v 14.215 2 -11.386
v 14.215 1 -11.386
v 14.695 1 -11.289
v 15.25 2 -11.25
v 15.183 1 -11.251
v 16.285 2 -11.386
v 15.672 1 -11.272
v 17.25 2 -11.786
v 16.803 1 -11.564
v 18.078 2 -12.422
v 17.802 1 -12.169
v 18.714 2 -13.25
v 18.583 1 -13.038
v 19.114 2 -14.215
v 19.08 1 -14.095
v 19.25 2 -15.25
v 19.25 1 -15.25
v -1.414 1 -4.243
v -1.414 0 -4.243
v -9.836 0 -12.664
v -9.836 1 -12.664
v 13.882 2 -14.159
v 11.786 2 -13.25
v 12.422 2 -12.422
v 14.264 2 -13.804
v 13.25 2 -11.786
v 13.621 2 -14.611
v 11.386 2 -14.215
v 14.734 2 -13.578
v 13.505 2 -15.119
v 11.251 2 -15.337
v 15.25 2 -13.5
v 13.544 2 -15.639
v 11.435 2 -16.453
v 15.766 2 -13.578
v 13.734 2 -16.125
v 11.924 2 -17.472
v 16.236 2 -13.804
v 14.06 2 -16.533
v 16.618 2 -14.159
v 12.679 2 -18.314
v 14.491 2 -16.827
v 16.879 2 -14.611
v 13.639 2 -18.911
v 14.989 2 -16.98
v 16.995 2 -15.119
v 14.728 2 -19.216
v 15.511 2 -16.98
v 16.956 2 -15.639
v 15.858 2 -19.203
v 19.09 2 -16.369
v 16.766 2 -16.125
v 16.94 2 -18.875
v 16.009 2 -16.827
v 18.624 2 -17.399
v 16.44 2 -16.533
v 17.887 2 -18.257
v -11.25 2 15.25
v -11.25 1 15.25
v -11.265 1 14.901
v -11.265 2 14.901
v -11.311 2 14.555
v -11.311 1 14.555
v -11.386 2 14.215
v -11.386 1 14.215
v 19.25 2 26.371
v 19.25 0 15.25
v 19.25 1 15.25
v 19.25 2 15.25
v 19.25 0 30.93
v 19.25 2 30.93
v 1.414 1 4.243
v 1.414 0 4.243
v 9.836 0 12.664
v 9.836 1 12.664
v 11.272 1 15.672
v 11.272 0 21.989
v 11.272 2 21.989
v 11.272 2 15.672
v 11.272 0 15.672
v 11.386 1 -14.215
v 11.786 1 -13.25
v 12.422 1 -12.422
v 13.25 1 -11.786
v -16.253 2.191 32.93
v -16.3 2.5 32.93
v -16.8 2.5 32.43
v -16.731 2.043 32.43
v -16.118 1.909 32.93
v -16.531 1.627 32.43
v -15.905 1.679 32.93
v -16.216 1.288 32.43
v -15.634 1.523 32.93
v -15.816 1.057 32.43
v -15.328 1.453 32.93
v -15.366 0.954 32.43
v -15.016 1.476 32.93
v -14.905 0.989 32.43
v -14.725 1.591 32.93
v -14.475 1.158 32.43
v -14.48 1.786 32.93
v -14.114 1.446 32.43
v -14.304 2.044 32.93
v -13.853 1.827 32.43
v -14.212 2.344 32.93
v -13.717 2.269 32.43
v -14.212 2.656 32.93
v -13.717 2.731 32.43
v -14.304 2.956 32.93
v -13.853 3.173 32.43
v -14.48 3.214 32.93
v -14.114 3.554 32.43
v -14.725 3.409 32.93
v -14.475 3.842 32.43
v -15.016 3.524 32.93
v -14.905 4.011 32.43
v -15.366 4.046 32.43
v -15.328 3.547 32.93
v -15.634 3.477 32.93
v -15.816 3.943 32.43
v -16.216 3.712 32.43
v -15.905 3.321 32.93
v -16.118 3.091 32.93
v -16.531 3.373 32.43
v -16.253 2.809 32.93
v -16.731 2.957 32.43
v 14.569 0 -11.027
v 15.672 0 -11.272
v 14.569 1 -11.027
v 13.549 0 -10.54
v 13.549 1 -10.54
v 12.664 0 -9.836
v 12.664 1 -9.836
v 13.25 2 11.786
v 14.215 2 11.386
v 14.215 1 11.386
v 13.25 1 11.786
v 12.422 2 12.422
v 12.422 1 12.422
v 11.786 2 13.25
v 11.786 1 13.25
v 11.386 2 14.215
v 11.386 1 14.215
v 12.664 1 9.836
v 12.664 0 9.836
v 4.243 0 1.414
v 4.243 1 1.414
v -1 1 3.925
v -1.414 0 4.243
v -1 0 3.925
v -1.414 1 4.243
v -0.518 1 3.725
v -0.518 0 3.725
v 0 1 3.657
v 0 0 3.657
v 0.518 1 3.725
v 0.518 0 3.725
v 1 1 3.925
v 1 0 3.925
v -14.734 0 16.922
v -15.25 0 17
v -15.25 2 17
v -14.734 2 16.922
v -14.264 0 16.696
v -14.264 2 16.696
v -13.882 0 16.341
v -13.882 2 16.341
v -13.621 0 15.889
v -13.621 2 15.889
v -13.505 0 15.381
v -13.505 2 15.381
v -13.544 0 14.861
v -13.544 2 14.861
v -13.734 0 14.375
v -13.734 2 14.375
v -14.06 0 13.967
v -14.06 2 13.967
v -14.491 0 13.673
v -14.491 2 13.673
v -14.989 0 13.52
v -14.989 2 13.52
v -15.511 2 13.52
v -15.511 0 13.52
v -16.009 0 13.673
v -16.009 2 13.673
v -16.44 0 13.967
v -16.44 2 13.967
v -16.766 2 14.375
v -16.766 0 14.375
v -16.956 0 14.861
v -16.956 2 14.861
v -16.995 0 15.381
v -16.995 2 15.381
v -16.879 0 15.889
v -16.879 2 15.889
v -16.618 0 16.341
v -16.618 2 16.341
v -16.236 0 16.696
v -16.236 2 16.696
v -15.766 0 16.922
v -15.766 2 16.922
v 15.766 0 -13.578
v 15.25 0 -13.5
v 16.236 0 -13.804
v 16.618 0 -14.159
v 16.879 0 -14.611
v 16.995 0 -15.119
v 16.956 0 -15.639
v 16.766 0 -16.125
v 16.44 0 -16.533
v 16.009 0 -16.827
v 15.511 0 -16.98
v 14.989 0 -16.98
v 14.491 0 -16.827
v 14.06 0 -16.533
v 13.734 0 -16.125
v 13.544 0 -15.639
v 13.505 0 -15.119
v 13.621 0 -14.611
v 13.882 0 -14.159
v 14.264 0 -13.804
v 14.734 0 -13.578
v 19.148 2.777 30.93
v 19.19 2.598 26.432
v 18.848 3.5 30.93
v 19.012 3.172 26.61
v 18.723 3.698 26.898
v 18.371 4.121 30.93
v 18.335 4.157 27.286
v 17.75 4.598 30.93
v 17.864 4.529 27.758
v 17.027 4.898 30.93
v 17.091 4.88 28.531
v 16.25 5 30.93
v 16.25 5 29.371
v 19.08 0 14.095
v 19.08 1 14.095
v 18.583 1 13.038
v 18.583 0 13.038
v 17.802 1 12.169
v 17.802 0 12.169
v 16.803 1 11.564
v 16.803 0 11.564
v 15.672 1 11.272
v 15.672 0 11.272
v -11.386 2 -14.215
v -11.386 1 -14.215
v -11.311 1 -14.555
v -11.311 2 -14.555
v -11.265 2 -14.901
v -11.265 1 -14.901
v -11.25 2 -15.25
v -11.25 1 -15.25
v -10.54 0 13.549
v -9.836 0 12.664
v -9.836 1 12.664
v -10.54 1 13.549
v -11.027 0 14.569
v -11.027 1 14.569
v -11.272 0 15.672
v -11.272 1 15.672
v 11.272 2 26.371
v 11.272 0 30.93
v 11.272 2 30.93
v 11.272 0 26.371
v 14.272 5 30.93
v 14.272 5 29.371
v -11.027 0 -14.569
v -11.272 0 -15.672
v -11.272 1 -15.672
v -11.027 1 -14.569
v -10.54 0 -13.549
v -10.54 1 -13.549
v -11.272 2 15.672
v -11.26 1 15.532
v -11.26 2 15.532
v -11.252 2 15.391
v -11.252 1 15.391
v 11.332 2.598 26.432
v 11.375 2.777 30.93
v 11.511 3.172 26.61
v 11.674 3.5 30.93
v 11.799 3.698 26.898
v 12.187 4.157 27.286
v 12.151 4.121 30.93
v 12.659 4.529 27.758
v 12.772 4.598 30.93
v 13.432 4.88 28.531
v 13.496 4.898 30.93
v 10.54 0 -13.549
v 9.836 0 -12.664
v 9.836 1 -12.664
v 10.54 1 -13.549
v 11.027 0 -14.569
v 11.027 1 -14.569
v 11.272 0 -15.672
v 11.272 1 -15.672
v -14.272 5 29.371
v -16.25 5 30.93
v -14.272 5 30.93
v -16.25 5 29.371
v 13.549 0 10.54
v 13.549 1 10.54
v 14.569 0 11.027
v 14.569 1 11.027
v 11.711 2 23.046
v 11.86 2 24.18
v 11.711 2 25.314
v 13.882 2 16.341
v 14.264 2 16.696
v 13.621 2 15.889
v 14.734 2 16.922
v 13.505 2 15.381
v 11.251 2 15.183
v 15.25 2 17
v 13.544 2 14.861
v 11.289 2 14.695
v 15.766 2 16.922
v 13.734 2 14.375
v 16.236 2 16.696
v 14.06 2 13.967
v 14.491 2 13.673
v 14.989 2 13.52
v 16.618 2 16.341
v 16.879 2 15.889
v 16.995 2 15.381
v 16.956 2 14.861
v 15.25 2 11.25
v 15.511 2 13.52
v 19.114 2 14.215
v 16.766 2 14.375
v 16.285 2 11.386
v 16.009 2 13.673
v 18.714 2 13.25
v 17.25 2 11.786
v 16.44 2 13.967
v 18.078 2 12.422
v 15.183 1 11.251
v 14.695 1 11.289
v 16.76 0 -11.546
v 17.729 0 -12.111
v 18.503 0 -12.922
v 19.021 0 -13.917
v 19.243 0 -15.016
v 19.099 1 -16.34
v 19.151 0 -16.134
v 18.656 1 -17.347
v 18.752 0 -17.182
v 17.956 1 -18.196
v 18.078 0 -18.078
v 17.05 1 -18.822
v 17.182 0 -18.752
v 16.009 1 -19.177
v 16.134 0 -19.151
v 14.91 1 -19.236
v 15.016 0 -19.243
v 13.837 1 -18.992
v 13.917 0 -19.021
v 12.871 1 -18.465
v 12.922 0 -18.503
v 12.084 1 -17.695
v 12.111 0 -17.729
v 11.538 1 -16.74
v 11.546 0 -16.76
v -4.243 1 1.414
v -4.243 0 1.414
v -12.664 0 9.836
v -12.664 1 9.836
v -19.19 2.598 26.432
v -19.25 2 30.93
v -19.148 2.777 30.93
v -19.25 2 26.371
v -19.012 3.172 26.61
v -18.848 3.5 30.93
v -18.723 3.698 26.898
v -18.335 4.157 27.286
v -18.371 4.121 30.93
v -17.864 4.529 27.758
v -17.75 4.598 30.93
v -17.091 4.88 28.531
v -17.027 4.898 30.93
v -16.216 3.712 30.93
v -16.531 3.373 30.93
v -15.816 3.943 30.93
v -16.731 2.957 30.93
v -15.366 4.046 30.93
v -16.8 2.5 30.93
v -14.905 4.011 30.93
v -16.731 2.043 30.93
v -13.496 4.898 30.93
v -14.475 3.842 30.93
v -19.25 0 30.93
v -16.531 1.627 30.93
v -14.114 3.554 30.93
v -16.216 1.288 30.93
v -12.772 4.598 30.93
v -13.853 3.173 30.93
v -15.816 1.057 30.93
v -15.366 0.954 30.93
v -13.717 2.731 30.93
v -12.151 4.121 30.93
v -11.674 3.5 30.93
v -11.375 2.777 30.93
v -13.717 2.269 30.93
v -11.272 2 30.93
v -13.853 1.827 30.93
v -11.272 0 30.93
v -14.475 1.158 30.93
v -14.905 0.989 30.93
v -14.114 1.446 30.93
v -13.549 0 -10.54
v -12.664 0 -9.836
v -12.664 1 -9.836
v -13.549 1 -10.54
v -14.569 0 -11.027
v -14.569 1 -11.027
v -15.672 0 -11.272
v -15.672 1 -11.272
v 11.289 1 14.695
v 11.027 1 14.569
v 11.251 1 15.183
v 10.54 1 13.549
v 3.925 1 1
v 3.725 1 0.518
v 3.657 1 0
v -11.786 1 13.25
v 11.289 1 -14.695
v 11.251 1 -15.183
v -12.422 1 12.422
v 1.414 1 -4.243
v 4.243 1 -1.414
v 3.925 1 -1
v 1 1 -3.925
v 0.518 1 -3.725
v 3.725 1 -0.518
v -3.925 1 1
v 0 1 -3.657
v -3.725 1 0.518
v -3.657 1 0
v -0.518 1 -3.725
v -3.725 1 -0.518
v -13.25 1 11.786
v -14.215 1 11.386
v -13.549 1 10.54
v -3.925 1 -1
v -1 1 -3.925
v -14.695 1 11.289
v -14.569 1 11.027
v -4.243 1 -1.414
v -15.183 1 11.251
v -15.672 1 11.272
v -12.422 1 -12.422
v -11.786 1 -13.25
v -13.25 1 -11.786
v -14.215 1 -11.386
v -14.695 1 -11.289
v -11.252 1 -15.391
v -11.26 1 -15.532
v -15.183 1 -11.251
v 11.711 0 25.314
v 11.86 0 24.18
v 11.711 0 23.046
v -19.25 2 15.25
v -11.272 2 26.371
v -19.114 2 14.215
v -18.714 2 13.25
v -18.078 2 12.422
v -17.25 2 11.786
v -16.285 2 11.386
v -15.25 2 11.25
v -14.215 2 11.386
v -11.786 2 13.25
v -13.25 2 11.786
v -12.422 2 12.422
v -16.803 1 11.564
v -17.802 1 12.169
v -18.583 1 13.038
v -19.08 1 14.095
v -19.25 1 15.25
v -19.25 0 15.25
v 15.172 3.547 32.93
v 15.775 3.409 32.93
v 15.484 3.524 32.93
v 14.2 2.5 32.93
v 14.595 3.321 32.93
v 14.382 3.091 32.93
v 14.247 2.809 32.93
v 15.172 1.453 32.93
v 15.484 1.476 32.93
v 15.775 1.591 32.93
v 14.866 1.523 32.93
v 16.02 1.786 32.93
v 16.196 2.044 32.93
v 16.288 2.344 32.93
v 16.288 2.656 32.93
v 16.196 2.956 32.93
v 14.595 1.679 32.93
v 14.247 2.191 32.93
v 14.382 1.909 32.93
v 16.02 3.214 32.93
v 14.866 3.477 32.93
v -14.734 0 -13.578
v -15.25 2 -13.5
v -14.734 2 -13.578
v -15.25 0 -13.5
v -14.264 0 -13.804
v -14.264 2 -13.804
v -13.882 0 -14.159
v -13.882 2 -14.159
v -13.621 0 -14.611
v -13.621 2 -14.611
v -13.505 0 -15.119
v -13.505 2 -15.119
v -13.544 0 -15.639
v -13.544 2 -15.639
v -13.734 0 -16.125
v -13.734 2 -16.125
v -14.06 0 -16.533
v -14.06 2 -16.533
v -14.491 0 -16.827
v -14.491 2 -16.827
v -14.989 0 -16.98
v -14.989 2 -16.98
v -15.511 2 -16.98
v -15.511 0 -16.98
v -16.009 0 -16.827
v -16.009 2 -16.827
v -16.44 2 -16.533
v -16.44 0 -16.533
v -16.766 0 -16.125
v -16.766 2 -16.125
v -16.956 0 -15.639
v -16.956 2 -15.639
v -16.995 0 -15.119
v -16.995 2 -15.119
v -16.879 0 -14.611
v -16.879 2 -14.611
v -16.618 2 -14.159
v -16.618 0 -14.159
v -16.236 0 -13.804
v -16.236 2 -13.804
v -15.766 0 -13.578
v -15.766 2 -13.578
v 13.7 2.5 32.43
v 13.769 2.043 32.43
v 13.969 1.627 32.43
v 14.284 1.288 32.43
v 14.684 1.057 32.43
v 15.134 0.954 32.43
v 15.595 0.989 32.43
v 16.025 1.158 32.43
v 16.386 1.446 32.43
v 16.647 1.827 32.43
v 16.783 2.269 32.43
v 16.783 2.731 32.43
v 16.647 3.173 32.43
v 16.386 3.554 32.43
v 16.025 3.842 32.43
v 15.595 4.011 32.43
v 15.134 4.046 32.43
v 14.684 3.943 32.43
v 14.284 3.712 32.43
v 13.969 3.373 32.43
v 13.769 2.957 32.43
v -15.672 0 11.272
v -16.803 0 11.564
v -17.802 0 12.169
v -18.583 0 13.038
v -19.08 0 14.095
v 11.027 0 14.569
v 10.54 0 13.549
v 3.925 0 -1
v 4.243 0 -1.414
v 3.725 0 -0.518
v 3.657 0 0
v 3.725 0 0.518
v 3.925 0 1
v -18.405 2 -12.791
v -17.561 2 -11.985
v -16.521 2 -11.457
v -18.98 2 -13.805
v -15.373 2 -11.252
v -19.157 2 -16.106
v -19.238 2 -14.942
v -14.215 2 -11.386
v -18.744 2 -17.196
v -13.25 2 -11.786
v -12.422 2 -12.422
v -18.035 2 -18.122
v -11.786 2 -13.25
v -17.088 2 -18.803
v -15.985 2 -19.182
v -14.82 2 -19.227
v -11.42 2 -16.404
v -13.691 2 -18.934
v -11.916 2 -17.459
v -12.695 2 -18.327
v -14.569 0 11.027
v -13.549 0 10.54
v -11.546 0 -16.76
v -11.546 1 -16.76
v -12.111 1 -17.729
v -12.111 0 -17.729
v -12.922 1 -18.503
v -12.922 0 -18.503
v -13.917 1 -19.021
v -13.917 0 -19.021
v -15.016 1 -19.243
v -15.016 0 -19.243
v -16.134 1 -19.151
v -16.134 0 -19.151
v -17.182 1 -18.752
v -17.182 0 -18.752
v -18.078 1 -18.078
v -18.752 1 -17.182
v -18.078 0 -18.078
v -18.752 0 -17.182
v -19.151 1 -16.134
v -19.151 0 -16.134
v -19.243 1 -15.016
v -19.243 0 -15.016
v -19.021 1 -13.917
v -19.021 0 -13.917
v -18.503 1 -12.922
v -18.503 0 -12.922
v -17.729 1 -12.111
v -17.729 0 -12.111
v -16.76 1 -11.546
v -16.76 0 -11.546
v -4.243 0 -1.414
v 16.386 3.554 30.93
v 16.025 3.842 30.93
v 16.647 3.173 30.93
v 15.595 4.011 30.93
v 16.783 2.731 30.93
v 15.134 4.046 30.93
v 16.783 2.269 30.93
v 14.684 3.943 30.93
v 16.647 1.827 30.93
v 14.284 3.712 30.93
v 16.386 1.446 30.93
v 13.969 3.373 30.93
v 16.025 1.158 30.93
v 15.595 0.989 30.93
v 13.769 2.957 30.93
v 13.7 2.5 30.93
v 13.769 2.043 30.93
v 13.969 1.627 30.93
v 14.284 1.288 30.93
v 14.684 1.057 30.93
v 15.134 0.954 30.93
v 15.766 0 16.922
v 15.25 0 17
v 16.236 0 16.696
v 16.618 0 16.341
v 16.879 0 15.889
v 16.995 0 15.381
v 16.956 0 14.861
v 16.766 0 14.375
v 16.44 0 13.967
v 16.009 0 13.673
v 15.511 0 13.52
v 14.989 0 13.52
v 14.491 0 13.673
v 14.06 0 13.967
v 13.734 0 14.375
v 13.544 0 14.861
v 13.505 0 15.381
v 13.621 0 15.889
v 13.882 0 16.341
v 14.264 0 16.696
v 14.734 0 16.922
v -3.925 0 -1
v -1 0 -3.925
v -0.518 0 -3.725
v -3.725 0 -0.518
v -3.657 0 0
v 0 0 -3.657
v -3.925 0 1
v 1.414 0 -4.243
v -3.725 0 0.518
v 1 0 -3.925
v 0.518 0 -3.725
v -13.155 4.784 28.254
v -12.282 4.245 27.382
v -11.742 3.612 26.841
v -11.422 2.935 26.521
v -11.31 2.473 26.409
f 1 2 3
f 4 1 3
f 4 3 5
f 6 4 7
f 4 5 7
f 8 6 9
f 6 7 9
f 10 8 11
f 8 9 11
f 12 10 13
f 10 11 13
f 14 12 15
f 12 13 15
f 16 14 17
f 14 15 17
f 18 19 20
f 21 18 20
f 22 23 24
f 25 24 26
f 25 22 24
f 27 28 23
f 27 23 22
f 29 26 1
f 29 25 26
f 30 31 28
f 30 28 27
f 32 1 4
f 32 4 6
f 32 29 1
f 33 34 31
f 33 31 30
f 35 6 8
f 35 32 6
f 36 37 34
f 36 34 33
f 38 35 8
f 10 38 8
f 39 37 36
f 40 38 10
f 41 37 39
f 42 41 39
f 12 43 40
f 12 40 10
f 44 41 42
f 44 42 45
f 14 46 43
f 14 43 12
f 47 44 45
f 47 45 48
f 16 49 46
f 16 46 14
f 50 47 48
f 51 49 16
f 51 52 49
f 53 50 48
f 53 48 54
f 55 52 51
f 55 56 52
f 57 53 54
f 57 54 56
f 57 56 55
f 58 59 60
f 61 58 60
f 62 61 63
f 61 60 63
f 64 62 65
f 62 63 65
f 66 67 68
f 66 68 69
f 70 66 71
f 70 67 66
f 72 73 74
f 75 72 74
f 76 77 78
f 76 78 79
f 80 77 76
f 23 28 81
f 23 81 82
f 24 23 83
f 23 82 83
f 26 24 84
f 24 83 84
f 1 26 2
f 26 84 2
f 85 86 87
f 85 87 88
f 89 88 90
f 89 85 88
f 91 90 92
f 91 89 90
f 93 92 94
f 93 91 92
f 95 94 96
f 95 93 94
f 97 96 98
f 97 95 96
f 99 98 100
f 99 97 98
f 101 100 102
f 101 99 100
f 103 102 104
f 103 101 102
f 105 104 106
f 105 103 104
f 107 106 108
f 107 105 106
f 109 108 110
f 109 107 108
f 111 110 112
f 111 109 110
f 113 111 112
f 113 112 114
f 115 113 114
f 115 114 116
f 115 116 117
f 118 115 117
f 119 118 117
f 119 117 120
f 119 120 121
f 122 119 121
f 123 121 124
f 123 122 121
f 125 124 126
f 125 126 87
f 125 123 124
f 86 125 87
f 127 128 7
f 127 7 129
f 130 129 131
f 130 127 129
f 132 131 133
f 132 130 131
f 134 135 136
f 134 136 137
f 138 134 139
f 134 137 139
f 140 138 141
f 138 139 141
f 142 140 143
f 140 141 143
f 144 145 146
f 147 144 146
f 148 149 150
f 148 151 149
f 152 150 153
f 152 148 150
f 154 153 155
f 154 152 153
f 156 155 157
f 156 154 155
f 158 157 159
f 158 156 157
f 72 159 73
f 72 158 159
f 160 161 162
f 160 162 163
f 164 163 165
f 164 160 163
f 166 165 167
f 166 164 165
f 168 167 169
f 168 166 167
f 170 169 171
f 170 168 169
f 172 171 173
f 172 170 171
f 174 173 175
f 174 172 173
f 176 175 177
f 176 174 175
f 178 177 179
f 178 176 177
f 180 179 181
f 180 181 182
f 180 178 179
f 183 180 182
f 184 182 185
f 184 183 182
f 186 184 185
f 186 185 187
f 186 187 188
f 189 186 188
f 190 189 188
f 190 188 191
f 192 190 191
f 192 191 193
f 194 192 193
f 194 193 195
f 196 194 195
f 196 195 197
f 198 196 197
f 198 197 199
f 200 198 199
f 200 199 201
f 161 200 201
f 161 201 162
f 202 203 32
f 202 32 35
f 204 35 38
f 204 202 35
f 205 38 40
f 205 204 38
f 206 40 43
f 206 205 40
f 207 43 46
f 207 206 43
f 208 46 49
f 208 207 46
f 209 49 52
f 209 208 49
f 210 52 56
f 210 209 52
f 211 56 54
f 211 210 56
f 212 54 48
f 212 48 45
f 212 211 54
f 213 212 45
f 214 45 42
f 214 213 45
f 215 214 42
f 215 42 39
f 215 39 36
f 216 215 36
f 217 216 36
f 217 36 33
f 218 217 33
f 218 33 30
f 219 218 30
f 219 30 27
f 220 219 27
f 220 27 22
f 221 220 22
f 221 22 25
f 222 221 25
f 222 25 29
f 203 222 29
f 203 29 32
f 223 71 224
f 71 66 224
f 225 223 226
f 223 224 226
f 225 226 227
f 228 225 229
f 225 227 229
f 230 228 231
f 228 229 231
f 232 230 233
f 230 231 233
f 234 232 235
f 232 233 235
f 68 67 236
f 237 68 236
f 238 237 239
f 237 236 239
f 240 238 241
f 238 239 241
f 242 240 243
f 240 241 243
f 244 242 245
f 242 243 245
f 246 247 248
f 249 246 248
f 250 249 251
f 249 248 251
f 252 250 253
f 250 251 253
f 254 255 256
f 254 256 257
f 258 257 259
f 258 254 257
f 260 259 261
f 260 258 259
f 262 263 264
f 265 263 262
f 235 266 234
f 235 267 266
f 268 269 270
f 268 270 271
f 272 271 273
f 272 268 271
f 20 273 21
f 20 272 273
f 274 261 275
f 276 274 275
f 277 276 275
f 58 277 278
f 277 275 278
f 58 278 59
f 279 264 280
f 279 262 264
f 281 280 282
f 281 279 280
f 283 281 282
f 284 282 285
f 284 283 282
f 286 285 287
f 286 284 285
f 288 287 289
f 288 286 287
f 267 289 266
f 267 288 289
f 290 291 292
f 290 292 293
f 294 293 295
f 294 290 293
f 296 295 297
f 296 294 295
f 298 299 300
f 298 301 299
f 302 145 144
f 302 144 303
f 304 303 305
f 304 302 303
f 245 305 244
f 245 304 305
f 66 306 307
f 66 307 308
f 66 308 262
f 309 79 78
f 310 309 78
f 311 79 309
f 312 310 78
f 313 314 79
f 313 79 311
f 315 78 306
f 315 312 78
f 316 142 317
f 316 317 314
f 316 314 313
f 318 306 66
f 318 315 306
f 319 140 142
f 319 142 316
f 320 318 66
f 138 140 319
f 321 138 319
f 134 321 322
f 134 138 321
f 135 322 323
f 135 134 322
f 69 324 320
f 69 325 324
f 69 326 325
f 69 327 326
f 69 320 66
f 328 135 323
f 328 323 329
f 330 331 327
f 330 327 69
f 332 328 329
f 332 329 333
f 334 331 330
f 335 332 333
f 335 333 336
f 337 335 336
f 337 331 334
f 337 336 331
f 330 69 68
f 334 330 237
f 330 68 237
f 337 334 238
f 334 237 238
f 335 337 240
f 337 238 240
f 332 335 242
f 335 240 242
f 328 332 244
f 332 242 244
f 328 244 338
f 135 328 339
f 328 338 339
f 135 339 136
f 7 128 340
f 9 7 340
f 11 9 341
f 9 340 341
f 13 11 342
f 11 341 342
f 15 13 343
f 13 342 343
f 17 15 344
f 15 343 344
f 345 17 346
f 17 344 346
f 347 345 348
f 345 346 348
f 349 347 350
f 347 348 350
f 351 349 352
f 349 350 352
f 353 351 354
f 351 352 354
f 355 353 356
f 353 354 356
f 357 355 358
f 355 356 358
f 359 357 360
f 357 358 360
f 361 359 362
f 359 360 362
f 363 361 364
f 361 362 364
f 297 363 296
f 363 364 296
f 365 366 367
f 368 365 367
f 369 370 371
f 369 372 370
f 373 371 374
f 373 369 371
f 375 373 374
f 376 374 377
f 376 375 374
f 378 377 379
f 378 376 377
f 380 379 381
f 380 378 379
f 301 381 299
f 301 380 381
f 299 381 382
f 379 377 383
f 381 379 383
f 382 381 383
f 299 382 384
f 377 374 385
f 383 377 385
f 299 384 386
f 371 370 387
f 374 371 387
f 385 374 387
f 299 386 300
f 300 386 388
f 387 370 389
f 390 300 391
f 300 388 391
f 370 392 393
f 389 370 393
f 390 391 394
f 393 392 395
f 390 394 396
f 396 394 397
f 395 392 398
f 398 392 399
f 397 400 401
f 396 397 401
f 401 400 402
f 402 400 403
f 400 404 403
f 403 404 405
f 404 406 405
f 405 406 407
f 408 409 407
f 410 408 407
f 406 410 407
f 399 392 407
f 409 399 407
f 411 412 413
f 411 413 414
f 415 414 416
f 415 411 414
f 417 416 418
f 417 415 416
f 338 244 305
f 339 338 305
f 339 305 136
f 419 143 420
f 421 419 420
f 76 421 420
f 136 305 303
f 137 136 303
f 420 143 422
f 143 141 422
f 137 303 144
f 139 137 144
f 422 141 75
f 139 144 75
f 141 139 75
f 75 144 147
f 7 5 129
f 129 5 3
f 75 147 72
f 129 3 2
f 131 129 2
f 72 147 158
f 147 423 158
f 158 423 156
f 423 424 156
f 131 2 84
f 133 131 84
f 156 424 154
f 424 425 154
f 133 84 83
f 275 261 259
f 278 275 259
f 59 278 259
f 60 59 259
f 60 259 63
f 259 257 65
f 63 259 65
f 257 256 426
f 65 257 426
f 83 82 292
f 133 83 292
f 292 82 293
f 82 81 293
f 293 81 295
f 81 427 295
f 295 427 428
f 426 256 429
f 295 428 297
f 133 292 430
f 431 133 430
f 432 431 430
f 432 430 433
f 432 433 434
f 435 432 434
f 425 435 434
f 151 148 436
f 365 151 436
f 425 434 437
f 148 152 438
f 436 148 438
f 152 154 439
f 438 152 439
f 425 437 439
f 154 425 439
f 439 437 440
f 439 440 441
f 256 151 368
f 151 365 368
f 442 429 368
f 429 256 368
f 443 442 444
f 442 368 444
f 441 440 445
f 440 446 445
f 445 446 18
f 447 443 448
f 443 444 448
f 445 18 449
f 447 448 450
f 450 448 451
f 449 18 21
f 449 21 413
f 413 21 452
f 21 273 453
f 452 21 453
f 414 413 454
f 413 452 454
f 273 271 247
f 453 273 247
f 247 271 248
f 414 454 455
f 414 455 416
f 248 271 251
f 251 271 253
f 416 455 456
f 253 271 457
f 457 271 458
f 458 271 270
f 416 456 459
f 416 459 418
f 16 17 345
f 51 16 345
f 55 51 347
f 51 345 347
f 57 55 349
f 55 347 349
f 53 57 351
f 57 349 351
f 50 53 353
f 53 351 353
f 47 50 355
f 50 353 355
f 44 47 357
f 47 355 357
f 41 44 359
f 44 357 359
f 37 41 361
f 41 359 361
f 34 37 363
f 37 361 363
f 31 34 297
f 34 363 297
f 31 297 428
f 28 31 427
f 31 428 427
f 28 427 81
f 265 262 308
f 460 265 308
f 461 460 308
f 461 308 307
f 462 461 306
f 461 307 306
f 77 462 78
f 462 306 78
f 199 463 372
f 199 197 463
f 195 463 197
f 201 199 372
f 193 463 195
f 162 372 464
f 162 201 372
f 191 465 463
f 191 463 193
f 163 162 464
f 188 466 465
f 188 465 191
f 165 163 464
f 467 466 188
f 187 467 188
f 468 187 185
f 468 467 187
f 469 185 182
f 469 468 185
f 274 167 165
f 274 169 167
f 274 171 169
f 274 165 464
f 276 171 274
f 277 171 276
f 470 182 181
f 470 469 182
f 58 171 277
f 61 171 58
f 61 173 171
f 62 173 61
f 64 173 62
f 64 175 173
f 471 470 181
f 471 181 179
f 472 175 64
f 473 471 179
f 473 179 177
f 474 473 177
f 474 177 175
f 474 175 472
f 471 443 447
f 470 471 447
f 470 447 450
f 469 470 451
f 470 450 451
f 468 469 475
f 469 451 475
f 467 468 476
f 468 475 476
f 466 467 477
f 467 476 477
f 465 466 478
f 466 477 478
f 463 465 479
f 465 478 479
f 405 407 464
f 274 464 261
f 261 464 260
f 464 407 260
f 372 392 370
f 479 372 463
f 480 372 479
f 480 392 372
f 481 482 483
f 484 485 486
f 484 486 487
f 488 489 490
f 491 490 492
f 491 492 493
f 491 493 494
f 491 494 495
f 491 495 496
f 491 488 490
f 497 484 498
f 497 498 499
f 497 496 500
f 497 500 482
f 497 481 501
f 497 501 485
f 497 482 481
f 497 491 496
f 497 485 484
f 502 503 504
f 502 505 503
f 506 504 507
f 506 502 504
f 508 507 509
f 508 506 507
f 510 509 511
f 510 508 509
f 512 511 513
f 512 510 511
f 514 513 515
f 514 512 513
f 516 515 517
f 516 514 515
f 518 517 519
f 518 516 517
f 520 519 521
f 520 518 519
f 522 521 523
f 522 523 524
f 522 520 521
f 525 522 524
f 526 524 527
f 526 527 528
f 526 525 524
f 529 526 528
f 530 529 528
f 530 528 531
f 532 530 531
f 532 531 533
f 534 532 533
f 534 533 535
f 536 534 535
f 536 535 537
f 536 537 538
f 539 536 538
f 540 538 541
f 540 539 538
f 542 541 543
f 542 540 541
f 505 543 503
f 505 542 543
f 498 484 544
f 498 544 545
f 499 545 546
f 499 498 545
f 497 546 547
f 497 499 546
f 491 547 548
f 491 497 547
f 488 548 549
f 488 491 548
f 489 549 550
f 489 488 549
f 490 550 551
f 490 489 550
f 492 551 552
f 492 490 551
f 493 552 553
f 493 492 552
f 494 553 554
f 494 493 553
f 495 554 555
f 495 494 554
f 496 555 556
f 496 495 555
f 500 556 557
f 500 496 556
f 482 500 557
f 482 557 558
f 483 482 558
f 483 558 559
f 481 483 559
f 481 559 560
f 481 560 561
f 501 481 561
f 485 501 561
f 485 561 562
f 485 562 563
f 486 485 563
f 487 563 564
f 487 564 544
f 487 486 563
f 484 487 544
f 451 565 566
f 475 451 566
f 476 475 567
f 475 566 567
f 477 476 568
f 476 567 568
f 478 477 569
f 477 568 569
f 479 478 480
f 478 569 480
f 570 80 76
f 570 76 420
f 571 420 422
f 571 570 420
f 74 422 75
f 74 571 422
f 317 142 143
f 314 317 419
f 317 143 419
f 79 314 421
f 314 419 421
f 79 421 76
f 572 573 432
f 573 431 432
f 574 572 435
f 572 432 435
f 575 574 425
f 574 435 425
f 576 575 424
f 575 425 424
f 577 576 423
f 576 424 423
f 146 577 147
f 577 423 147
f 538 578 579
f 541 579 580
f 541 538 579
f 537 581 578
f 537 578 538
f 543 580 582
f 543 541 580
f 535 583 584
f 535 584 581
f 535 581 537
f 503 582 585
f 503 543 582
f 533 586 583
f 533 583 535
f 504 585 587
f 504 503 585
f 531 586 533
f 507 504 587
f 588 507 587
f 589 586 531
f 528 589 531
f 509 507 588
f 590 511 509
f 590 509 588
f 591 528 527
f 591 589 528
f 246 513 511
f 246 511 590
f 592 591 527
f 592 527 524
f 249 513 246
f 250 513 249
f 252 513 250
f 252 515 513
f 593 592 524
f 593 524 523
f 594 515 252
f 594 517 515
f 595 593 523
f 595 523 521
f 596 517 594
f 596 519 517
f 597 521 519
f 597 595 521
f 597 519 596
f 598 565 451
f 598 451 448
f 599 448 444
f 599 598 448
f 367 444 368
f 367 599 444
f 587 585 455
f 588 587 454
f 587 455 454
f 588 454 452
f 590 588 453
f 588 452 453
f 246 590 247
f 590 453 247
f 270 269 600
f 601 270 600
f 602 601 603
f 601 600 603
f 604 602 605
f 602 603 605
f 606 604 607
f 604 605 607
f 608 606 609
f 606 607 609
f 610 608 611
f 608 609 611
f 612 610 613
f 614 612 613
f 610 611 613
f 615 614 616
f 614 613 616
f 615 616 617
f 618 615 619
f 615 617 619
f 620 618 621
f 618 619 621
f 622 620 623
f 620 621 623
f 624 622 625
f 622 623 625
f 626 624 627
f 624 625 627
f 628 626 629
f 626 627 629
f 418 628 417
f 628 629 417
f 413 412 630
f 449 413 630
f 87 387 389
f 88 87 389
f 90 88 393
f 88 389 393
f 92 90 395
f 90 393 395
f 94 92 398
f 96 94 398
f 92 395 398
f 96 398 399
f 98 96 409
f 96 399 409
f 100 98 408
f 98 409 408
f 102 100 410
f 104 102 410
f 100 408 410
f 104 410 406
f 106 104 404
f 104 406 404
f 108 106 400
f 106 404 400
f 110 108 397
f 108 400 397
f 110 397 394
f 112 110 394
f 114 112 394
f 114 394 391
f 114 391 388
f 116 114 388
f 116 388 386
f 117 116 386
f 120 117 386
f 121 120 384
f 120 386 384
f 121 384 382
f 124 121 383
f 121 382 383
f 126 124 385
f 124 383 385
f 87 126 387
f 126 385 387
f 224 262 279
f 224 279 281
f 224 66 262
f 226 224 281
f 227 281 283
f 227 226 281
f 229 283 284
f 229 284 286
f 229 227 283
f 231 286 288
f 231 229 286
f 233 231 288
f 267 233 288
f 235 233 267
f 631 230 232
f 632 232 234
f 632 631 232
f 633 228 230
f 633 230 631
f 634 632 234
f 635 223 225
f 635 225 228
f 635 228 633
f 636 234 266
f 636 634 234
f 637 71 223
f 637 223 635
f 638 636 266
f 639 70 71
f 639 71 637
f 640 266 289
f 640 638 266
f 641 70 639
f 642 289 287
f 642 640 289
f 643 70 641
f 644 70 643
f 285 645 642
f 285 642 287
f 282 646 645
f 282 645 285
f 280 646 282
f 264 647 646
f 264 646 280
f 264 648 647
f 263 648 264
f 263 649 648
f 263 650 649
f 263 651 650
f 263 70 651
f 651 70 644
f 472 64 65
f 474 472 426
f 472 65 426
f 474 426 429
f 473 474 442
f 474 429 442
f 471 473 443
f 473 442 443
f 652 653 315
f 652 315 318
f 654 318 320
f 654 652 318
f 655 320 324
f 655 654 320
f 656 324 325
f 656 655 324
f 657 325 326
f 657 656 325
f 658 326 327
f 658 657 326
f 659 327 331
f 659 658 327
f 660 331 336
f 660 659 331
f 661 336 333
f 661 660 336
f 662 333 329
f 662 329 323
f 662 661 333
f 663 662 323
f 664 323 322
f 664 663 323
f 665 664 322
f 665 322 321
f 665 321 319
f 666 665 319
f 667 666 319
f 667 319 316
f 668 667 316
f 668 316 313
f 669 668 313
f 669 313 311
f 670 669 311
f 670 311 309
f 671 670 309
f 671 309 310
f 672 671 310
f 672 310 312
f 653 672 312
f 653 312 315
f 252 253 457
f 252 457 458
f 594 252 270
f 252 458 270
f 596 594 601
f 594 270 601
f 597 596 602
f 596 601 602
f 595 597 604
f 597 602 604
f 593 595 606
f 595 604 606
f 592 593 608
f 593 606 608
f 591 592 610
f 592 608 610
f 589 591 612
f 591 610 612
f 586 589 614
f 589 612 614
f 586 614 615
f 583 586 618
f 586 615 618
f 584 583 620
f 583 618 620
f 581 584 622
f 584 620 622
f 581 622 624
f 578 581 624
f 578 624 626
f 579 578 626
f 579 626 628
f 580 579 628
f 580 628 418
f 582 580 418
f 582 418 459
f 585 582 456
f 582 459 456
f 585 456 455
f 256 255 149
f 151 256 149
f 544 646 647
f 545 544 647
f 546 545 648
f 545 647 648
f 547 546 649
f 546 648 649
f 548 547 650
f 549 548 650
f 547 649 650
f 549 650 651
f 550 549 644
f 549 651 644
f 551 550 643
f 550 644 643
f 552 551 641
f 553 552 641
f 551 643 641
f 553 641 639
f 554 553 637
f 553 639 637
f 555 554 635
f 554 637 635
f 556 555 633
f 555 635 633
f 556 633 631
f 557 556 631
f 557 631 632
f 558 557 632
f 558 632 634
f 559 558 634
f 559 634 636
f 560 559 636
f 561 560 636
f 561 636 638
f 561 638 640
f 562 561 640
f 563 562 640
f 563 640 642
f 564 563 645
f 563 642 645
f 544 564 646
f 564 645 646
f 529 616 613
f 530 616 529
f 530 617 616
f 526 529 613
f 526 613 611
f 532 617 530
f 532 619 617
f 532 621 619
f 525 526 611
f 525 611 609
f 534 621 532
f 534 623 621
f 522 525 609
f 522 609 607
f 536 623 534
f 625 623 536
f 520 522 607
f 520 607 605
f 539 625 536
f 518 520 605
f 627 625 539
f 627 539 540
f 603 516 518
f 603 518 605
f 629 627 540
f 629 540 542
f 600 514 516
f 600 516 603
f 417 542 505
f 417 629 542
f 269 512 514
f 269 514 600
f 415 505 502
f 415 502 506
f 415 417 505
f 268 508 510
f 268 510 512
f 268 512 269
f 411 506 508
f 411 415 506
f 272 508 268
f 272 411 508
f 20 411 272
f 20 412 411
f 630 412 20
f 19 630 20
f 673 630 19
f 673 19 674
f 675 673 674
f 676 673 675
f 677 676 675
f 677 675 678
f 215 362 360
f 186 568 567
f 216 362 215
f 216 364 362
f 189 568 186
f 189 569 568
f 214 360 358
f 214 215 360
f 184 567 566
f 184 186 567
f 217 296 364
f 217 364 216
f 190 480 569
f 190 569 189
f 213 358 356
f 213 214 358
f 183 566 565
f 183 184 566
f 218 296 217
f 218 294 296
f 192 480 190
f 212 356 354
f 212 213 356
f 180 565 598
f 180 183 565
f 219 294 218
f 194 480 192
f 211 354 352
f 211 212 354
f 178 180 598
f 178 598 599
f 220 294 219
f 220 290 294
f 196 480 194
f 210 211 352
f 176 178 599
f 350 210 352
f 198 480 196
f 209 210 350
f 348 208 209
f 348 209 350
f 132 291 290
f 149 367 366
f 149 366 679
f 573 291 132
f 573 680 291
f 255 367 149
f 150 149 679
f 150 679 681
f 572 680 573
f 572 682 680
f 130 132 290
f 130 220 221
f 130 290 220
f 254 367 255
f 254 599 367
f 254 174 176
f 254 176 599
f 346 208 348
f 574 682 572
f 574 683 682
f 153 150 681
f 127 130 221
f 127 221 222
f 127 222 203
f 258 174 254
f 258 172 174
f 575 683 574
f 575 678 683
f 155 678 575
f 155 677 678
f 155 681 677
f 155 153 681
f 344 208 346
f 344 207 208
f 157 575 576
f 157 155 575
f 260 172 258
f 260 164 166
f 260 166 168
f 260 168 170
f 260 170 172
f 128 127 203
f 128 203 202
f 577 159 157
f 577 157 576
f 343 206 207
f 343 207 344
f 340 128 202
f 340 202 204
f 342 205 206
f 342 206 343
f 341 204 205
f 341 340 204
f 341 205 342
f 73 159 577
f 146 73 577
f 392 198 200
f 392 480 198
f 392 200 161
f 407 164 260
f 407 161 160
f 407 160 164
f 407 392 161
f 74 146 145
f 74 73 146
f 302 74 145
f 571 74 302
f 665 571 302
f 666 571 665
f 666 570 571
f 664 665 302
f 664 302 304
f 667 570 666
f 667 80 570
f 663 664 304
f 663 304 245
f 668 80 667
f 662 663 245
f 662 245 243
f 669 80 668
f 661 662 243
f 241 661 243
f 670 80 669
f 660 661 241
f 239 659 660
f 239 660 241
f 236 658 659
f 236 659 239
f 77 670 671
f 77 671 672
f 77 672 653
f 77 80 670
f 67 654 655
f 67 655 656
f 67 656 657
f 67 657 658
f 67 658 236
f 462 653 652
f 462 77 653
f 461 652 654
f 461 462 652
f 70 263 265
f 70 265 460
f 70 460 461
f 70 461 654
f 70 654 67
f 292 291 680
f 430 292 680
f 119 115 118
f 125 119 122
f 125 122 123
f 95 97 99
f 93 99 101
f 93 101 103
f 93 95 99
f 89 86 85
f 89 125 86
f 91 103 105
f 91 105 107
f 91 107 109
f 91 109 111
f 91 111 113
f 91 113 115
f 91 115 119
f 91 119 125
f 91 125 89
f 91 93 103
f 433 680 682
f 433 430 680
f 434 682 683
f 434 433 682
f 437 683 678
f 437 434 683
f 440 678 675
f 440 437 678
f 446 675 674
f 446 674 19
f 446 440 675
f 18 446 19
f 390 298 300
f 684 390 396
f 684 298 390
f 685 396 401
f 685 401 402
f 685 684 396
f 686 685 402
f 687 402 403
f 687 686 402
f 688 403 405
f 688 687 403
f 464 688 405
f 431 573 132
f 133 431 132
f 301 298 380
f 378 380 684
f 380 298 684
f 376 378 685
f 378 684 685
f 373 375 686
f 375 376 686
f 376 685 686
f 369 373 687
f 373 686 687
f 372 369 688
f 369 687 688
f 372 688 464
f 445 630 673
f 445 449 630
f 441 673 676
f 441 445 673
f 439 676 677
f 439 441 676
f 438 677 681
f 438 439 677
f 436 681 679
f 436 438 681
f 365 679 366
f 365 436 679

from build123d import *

# Parameters (mm, degrees)
SKETCH1_R           = 1.75
BOSS_EXTRUDE1_DEPTH = 1
SKETCH2_R           = 1.75
BOSS_EXTRUDE2_DEPTH = 1
FILLET1_R           = 5
FILLET2_R           = 2
BOSS_EXTRUDE3_REACH = 29.297
CUT_EXTRUDE1_REACH  = 38.486
SKETCH4_R           = 4.38
SKETCH5_W           = 7.977665541
SKETCH5_H           = 4.558516631
BOSS_EXTRUDE4_DEPTH = 3
SKETCH6_R           = 1.55
BOSS_EXTRUDE5_DEPTH = 2
FILLET3_R           = 3
CHAMFER1_SIZE       = 0.5


# Some blends are built 0.0001 mm under size
with BuildPart() as part:
    # Sketch1 → Boss-Extrude1 (new body)
    with BuildSketch(Plane(origin=(0, 0, 0), x_dir=(1, 0, 0), z_dir=(0, 1, 0))):
        with BuildLine():
            ThreePointArc((-11.386296695, 14.21472382), (-18.078427125, 18.078427125), (-14.21472382, 11.386296695))
            Line((-14.21472382, 11.386296695), (-2.828427125, 0))
            Line((-2.828427125, 0), (-14.21472382, -11.386296695))
            ThreePointArc((-14.21472382, -11.386296695), (-18.078427125, -18.078427125), (-11.386296695, -14.21472382))
            Line((-11.386296695, -14.21472382), (0, -2.828427125))
            Line((0, -2.828427125), (11.386296695, -14.21472382))
            ThreePointArc((11.386296695, -14.21472382), (18.078427125, -18.078427125), (14.21472382, -11.386296695))
            Line((14.21472382, -11.386296695), (2.828427125, 0))
            Line((2.828427125, 0), (14.21472382, 11.386296695))
            ThreePointArc((14.21472382, 11.386296695), (18.078427125, 18.078427125), (11.386296695, 14.21472382))
            Line((11.386296695, 14.21472382), (0, 2.828427125))
            Line((0, 2.828427125), (-11.386296695, 14.21472382))
        make_face()
        with Locations(Location((-15.25, -15.25, 0), (0, 0, 270))):
            Circle(SKETCH1_R, mode=Mode.SUBTRACT)
        with Locations(Location((15.25, -15.25, 0), (0, 0, 270))):
            Circle(SKETCH1_R, mode=Mode.SUBTRACT)
        with Locations(Location((-15.25, 15.25, 0), (0, 0, 270))):
            Circle(SKETCH1_R, mode=Mode.SUBTRACT)
        with Locations(Location((15.25, 15.25, 0), (0, 0, 270))):
            Circle(SKETCH1_R, mode=Mode.SUBTRACT)
    extrude(amount=BOSS_EXTRUDE1_DEPTH)

    # Sketch2 → Boss-Extrude2 (add)
    # profile 1 of 4: a face of its own
    with BuildSketch(Plane(origin=(0, 1, 0), x_dir=(1, 0, 0), z_dir=(0, 1, 0))):
        with BuildLine():
            ThreePointArc((-11.386296695, 14.21472382), (-11.284220555, 14.727895231), (-11.25, 15.25))
            ThreePointArc((-11.25, 15.25), (-18.423413361, 17.685045716), (-14.21472382, 11.386296695))
            ThreePointArc((-14.21472382, 11.386296695), (-12.421572875, 12.421572875), (-11.386296695, 14.21472382))
        make_face()
        with Locations(Location((-15.25, 15.25, 0), (0, 0, 270))):
            Circle(SKETCH2_R, mode=Mode.SUBTRACT)
    # profile 2 of 4: a face of its own
    with BuildSketch(Plane(origin=(0, 1, 0), x_dir=(1, 0, 0), z_dir=(0, 1, 0))):
        with BuildLine():
            ThreePointArc((-14.21472382, -11.386296695), (-18.423413361, -17.685045716), (-11.25, -15.25))
            ThreePointArc((-11.25, -15.25), (-11.284220555, -14.727895231), (-11.386296695, -14.21472382))
            ThreePointArc((-11.386296695, -14.21472382), (-12.421572875, -12.421572875), (-14.21472382, -11.386296695))
        make_face()
        with Locations(Location((-15.25, -15.25, 0), (0, 0, 270))):
            Circle(SKETCH2_R, mode=Mode.SUBTRACT)
    # profile 3 of 4: a face of its own
    with BuildSketch(Plane(origin=(0, 1, 0), x_dir=(1, 0, 0), z_dir=(0, 1, 0))):
        with BuildLine():
            ThreePointArc((11.386296695, -14.21472382), (14.727895231, -19.215779445), (19.25, -15.25))
            ThreePointArc((19.25, -15.25), (17.685045716, -12.076586639), (14.21472382, -11.386296695))
            ThreePointArc((14.21472382, -11.386296695), (12.421572875, -12.421572875), (11.386296695, -14.21472382))
        make_face()
        with Locations(Location((15.25, -15.25, 0), (0, 0, 270))):
            Circle(SKETCH2_R, mode=Mode.SUBTRACT)
    # profile 4 of 4: a face of its own
    with BuildSketch(Plane(origin=(0, 1, 0), x_dir=(1, 0, 0), z_dir=(0, 1, 0))):
        with BuildLine():
            ThreePointArc((14.21472382, 11.386296695), (17.685045716, 12.076586639), (19.25, 15.25))
            ThreePointArc((19.25, 15.25), (14.727895231, 19.215779445), (11.386296695, 14.21472382))
            ThreePointArc((11.386296695, 14.21472382), (12.421572875, 12.421572875), (14.21472382, 11.386296695))
        make_face()
        with Locations(Location((15.25, 15.25, 0), (0, 0, 270))):
            Circle(SKETCH2_R, mode=Mode.SUBTRACT)
    extrude(amount=BOSS_EXTRUDE2_DEPTH)

    # Fillet1
    # the kernel refuses this fillet: 5 mm, written as the material it adds along each edge
    with BuildSketch(Plane(origin=(-11.386296695, 0, -14.21472382), x_dir=(0.07795833957339635, 0, -0.9969566175571327), z_dir=(0, 1, 0))) as fillet1_piece_1:
        with BuildLine():
            CenterArc((2.375482021, -4.915816238), FILLET1_R, 100.528779366, 38.942441269)
            Line((-1.424916256, -1.666666667), (-1.500924222, -1.601683675))
            Line((-1.500924222, -1.601683675), (-0.076007966, 0.064982991))
            Line((-0.076007966, 0.064982991), (0.018272939, 0.098316325))
            ThreePointArc((0.018272939, 0.098316325), (0.730917545, 0.03265299), (1.443562151, 0.098316325))
            Line((1.443562151, 0.098316325), (1.46183509, 0))
        make_face()
    extrude(amount=1)
    with BuildSketch(Plane(origin=(11.386296695, 0, -14.21472382), x_dir=(-0.7071067811865598, 0, 0.7071067811865355), z_dir=(0, 1, 0))) as fillet1_piece_2:
        with BuildLine():
            CenterArc((2.192752634, -5), FILLET1_R, 90, 38.942441269)
            Line((-0.949944171, -1.111111111), (-1.012798107, -1.033333333))
            ThreePointArc((-1.012798107, -1.033333333), (-0.499790959, -0.534336666), (-0.08660254, 0.05))
            Line((-0.08660254, 0.05), (0, 0.1))
            Line((0, 0.1), (2.192752634, 0.1))
            Line((2.192752634, 0.1), (2.192752634, 0))
        make_face()
    extrude(amount=1)
    with BuildSketch(Plane(origin=(14.21472382, 0, -11.386296695), x_dir=(-0.7071067811865354, 0, 0.7071067811865597), z_dir=(0, 1, 0)), Plane(origin=(11.386296695, 0, 14.21472382), x_dir=(-0.7071067811865589, 0, -0.7071067811865362), z_dir=(0, 1, 0)), Plane(origin=(-14.21472382, 0, 11.386296695), x_dir=(0.707106781186535, 0, -0.7071067811865601), z_dir=(0, 1, 0))) as fillet1_piece_3:
        with BuildLine():
            CenterArc((2.192752634, 5), FILLET1_R, 231.057558731, 38.942441269)
            Line((-0.949944171, 1.111111111), (-1.012798107, 1.033333333))
            ThreePointArc((-1.012798107, 1.033333333), (-0.499790959, 0.534336666), (-0.08660254, -0.05))
            Line((-0.08660254, -0.05), (0, -0.1))
            Line((0, -0.1), (2.192752634, -0.1))
            Line((2.192752634, -0.1), (2.192752634, 0))
        make_face()
    extrude(amount=1)
    with BuildSketch(Plane(origin=(14.21472382, 0, 11.386296695), x_dir=(0.9969566175571322, 0, -0.07795833957340413), z_dir=(0, 1, 0)), Plane(origin=(-11.386296695, 0, 14.21472382), x_dir=(0.07795833957339876, 0, 0.9969566175571326), z_dir=(0, 1, 0)), Plane(origin=(-14.21472382, 0, -11.386296695), x_dir=(-0.9969566175571319, 0, 0.07795833957340663), z_dir=(0, 1, 0))) as fillet1_piece_4:
        with BuildLine():
            CenterArc((2.375482021, 4.915816238), FILLET1_R, 220.528779366, 38.942441269)
            Line((-1.424916256, 1.666666667), (-1.500924222, 1.601683675))
            Line((-1.500924222, 1.601683675), (-0.076007966, -0.064982991))
            Line((-0.076007966, -0.064982991), (0.018272939, -0.098316325))
            ThreePointArc((0.018272939, -0.098316325), (0.730917545, -0.03265299), (1.443562151, -0.098316325))
            Line((1.443562151, -0.098316325), (1.46183509, 0))
        make_face()
    extrude(amount=1)

    # Fillet2
    fillet2_edges = [part.edges().sort_by_distance(p)[0] for p in [
        (0, 0.5, -2.828427125),
        (2.828427125, 0.5, 0),
        (0, 0.5, 2.828427125),
        (-2.828427125, 0.5, 0),
    ]]
    fillet(fillet2_edges, radius=FILLET2_R)

    # Boss-Extrude3: up to this face of the body (flat: up to its plane)
    boss_extrude3_end = Plane(part.part.faces().sort_by_distance((11.363137085, 2, 15.25))[0])
    # Sketch3 → Boss-Extrude3 (add, up to the picked face)
    with BuildSketch(Plane.XZ, mode=Mode.PRIVATE) as boss_extrude3_sk1:
        with BuildLine():
            Line((-11.272334459, 30.93), (-19.25, 30.93))
            Line((-19.25, 30.93), (-19.25, 15.25))
            ThreePointArc((-19.25, 15.25), (-15.461350224, 19.244412483), (-11.272334459, 15.672109986))
            Line((-11.272334459, 15.672109986), (-11.272334459, 30.93))
        make_face()
    boss_extrude3_tool1 = split(extrude(boss_extrude3_sk1.sketch, amount=-BOSS_EXTRUDE3_REACH, mode=Mode.PRIVATE), bisect_by=boss_extrude3_end, keep=Keep.BOTH, mode=Mode.PRIVATE)
    # Sketch3 → Boss-Extrude3 (add, up to the picked face)
    with BuildSketch(Plane.XZ, mode=Mode.PRIVATE) as boss_extrude3_sk2:
        with BuildLine():
            Line((19.25, 30.93), (11.272334459, 30.93))
            Line((11.272334459, 30.93), (11.272334459, 15.672109986))
            ThreePointArc((11.272334459, 15.672109986), (15.461350224, 19.244412483), (19.25, 15.25))
            Line((19.25, 15.25), (19.25, 30.93))
        make_face()
    boss_extrude3_tool2 = split(extrude(boss_extrude3_sk2.sketch, amount=-BOSS_EXTRUDE3_REACH, mode=Mode.PRIVATE), bisect_by=boss_extrude3_end, keep=Keep.BOTH, mode=Mode.PRIVATE)
    add(boss_extrude3_tool1.solids().sort_by(Axis((-15.263723, 0, 24.633823), (0, 1, 0)))[0])
    add(boss_extrude3_tool2.solids().sort_by(Axis((15.263723, 0, 24.633823), (0, 1, 0)))[0])

    # Sketch4 → Cut-Extrude1 (cut, up to next)
    with BuildSketch(Plane(origin=(0, 2, 0), x_dir=(1, 0, 0), z_dir=(0, 1, 0)), mode=Mode.PRIVATE) as cut_extrude1_sk1:
        with Locations((7.48, -24.18)):
            Circle(SKETCH4_R)
    cut_extrude1_tool1 = extrude(cut_extrude1_sk1.sketch, amount=-CUT_EXTRUDE1_REACH, mode=Mode.PRIVATE) & part.part
    add(cut_extrude1_tool1.solids().sort_by_distance((7.48, 2, 24.18))[0], mode=Mode.SUBTRACT)

    # Sketch5 → Boss-Extrude4 (add)
    with BuildSketch(Plane(origin=(0, 2, 0), x_dir=(1, 0, 0), z_dir=(0, 1, 0))):
        with Locations((-15.261167229, -28.650741685)):
            Rectangle(SKETCH5_W, SKETCH5_H)
        with Locations((15.261167229, -28.650741685)):
            Rectangle(SKETCH5_W, SKETCH5_H)
    extrude(amount=BOSS_EXTRUDE4_DEPTH)

    # Sketch6 → Boss-Extrude5 (add)
    with BuildSketch(Plane.XY.offset(30.93)):
        with Locations(Location((-15.25, 2.5, 0), (0, 0, 180))):
            Circle(SKETCH6_R)
        with Locations(Location((15.25, 2.5, 0), (0, 0, 180))):
            Circle(SKETCH6_R)
    extrude(amount=BOSS_EXTRUDE5_DEPTH)

    # Fillet3
    fillet3_edges = [part.edges().sort_by_distance(p)[0] for p in [
        (19.25, 5, 28.650741684),
        (11.272334459, 5, 28.650741684),
        (-11.272334459, 5, 28.650741684),
        (-19.25, 5, 28.650741684),
        (15.261167229, 5, 26.371483369),
        (-15.261167229, 5, 26.371483369),
    ]]
    fillet(fillet3_edges, radius=FILLET3_R - 0.0001)  # a hair under: the kernel refuses the full size

    # Chamfer1
    chamfer1_edges = [part.edges().sort_by_distance(p)[0] for p in [
        (-13.7, 2.5, 32.93),
        (16.8, 2.5, 32.93),
    ]]
    chamfer(chamfer1_edges, length=CHAMFER1_SIZE)


solid = part.part
